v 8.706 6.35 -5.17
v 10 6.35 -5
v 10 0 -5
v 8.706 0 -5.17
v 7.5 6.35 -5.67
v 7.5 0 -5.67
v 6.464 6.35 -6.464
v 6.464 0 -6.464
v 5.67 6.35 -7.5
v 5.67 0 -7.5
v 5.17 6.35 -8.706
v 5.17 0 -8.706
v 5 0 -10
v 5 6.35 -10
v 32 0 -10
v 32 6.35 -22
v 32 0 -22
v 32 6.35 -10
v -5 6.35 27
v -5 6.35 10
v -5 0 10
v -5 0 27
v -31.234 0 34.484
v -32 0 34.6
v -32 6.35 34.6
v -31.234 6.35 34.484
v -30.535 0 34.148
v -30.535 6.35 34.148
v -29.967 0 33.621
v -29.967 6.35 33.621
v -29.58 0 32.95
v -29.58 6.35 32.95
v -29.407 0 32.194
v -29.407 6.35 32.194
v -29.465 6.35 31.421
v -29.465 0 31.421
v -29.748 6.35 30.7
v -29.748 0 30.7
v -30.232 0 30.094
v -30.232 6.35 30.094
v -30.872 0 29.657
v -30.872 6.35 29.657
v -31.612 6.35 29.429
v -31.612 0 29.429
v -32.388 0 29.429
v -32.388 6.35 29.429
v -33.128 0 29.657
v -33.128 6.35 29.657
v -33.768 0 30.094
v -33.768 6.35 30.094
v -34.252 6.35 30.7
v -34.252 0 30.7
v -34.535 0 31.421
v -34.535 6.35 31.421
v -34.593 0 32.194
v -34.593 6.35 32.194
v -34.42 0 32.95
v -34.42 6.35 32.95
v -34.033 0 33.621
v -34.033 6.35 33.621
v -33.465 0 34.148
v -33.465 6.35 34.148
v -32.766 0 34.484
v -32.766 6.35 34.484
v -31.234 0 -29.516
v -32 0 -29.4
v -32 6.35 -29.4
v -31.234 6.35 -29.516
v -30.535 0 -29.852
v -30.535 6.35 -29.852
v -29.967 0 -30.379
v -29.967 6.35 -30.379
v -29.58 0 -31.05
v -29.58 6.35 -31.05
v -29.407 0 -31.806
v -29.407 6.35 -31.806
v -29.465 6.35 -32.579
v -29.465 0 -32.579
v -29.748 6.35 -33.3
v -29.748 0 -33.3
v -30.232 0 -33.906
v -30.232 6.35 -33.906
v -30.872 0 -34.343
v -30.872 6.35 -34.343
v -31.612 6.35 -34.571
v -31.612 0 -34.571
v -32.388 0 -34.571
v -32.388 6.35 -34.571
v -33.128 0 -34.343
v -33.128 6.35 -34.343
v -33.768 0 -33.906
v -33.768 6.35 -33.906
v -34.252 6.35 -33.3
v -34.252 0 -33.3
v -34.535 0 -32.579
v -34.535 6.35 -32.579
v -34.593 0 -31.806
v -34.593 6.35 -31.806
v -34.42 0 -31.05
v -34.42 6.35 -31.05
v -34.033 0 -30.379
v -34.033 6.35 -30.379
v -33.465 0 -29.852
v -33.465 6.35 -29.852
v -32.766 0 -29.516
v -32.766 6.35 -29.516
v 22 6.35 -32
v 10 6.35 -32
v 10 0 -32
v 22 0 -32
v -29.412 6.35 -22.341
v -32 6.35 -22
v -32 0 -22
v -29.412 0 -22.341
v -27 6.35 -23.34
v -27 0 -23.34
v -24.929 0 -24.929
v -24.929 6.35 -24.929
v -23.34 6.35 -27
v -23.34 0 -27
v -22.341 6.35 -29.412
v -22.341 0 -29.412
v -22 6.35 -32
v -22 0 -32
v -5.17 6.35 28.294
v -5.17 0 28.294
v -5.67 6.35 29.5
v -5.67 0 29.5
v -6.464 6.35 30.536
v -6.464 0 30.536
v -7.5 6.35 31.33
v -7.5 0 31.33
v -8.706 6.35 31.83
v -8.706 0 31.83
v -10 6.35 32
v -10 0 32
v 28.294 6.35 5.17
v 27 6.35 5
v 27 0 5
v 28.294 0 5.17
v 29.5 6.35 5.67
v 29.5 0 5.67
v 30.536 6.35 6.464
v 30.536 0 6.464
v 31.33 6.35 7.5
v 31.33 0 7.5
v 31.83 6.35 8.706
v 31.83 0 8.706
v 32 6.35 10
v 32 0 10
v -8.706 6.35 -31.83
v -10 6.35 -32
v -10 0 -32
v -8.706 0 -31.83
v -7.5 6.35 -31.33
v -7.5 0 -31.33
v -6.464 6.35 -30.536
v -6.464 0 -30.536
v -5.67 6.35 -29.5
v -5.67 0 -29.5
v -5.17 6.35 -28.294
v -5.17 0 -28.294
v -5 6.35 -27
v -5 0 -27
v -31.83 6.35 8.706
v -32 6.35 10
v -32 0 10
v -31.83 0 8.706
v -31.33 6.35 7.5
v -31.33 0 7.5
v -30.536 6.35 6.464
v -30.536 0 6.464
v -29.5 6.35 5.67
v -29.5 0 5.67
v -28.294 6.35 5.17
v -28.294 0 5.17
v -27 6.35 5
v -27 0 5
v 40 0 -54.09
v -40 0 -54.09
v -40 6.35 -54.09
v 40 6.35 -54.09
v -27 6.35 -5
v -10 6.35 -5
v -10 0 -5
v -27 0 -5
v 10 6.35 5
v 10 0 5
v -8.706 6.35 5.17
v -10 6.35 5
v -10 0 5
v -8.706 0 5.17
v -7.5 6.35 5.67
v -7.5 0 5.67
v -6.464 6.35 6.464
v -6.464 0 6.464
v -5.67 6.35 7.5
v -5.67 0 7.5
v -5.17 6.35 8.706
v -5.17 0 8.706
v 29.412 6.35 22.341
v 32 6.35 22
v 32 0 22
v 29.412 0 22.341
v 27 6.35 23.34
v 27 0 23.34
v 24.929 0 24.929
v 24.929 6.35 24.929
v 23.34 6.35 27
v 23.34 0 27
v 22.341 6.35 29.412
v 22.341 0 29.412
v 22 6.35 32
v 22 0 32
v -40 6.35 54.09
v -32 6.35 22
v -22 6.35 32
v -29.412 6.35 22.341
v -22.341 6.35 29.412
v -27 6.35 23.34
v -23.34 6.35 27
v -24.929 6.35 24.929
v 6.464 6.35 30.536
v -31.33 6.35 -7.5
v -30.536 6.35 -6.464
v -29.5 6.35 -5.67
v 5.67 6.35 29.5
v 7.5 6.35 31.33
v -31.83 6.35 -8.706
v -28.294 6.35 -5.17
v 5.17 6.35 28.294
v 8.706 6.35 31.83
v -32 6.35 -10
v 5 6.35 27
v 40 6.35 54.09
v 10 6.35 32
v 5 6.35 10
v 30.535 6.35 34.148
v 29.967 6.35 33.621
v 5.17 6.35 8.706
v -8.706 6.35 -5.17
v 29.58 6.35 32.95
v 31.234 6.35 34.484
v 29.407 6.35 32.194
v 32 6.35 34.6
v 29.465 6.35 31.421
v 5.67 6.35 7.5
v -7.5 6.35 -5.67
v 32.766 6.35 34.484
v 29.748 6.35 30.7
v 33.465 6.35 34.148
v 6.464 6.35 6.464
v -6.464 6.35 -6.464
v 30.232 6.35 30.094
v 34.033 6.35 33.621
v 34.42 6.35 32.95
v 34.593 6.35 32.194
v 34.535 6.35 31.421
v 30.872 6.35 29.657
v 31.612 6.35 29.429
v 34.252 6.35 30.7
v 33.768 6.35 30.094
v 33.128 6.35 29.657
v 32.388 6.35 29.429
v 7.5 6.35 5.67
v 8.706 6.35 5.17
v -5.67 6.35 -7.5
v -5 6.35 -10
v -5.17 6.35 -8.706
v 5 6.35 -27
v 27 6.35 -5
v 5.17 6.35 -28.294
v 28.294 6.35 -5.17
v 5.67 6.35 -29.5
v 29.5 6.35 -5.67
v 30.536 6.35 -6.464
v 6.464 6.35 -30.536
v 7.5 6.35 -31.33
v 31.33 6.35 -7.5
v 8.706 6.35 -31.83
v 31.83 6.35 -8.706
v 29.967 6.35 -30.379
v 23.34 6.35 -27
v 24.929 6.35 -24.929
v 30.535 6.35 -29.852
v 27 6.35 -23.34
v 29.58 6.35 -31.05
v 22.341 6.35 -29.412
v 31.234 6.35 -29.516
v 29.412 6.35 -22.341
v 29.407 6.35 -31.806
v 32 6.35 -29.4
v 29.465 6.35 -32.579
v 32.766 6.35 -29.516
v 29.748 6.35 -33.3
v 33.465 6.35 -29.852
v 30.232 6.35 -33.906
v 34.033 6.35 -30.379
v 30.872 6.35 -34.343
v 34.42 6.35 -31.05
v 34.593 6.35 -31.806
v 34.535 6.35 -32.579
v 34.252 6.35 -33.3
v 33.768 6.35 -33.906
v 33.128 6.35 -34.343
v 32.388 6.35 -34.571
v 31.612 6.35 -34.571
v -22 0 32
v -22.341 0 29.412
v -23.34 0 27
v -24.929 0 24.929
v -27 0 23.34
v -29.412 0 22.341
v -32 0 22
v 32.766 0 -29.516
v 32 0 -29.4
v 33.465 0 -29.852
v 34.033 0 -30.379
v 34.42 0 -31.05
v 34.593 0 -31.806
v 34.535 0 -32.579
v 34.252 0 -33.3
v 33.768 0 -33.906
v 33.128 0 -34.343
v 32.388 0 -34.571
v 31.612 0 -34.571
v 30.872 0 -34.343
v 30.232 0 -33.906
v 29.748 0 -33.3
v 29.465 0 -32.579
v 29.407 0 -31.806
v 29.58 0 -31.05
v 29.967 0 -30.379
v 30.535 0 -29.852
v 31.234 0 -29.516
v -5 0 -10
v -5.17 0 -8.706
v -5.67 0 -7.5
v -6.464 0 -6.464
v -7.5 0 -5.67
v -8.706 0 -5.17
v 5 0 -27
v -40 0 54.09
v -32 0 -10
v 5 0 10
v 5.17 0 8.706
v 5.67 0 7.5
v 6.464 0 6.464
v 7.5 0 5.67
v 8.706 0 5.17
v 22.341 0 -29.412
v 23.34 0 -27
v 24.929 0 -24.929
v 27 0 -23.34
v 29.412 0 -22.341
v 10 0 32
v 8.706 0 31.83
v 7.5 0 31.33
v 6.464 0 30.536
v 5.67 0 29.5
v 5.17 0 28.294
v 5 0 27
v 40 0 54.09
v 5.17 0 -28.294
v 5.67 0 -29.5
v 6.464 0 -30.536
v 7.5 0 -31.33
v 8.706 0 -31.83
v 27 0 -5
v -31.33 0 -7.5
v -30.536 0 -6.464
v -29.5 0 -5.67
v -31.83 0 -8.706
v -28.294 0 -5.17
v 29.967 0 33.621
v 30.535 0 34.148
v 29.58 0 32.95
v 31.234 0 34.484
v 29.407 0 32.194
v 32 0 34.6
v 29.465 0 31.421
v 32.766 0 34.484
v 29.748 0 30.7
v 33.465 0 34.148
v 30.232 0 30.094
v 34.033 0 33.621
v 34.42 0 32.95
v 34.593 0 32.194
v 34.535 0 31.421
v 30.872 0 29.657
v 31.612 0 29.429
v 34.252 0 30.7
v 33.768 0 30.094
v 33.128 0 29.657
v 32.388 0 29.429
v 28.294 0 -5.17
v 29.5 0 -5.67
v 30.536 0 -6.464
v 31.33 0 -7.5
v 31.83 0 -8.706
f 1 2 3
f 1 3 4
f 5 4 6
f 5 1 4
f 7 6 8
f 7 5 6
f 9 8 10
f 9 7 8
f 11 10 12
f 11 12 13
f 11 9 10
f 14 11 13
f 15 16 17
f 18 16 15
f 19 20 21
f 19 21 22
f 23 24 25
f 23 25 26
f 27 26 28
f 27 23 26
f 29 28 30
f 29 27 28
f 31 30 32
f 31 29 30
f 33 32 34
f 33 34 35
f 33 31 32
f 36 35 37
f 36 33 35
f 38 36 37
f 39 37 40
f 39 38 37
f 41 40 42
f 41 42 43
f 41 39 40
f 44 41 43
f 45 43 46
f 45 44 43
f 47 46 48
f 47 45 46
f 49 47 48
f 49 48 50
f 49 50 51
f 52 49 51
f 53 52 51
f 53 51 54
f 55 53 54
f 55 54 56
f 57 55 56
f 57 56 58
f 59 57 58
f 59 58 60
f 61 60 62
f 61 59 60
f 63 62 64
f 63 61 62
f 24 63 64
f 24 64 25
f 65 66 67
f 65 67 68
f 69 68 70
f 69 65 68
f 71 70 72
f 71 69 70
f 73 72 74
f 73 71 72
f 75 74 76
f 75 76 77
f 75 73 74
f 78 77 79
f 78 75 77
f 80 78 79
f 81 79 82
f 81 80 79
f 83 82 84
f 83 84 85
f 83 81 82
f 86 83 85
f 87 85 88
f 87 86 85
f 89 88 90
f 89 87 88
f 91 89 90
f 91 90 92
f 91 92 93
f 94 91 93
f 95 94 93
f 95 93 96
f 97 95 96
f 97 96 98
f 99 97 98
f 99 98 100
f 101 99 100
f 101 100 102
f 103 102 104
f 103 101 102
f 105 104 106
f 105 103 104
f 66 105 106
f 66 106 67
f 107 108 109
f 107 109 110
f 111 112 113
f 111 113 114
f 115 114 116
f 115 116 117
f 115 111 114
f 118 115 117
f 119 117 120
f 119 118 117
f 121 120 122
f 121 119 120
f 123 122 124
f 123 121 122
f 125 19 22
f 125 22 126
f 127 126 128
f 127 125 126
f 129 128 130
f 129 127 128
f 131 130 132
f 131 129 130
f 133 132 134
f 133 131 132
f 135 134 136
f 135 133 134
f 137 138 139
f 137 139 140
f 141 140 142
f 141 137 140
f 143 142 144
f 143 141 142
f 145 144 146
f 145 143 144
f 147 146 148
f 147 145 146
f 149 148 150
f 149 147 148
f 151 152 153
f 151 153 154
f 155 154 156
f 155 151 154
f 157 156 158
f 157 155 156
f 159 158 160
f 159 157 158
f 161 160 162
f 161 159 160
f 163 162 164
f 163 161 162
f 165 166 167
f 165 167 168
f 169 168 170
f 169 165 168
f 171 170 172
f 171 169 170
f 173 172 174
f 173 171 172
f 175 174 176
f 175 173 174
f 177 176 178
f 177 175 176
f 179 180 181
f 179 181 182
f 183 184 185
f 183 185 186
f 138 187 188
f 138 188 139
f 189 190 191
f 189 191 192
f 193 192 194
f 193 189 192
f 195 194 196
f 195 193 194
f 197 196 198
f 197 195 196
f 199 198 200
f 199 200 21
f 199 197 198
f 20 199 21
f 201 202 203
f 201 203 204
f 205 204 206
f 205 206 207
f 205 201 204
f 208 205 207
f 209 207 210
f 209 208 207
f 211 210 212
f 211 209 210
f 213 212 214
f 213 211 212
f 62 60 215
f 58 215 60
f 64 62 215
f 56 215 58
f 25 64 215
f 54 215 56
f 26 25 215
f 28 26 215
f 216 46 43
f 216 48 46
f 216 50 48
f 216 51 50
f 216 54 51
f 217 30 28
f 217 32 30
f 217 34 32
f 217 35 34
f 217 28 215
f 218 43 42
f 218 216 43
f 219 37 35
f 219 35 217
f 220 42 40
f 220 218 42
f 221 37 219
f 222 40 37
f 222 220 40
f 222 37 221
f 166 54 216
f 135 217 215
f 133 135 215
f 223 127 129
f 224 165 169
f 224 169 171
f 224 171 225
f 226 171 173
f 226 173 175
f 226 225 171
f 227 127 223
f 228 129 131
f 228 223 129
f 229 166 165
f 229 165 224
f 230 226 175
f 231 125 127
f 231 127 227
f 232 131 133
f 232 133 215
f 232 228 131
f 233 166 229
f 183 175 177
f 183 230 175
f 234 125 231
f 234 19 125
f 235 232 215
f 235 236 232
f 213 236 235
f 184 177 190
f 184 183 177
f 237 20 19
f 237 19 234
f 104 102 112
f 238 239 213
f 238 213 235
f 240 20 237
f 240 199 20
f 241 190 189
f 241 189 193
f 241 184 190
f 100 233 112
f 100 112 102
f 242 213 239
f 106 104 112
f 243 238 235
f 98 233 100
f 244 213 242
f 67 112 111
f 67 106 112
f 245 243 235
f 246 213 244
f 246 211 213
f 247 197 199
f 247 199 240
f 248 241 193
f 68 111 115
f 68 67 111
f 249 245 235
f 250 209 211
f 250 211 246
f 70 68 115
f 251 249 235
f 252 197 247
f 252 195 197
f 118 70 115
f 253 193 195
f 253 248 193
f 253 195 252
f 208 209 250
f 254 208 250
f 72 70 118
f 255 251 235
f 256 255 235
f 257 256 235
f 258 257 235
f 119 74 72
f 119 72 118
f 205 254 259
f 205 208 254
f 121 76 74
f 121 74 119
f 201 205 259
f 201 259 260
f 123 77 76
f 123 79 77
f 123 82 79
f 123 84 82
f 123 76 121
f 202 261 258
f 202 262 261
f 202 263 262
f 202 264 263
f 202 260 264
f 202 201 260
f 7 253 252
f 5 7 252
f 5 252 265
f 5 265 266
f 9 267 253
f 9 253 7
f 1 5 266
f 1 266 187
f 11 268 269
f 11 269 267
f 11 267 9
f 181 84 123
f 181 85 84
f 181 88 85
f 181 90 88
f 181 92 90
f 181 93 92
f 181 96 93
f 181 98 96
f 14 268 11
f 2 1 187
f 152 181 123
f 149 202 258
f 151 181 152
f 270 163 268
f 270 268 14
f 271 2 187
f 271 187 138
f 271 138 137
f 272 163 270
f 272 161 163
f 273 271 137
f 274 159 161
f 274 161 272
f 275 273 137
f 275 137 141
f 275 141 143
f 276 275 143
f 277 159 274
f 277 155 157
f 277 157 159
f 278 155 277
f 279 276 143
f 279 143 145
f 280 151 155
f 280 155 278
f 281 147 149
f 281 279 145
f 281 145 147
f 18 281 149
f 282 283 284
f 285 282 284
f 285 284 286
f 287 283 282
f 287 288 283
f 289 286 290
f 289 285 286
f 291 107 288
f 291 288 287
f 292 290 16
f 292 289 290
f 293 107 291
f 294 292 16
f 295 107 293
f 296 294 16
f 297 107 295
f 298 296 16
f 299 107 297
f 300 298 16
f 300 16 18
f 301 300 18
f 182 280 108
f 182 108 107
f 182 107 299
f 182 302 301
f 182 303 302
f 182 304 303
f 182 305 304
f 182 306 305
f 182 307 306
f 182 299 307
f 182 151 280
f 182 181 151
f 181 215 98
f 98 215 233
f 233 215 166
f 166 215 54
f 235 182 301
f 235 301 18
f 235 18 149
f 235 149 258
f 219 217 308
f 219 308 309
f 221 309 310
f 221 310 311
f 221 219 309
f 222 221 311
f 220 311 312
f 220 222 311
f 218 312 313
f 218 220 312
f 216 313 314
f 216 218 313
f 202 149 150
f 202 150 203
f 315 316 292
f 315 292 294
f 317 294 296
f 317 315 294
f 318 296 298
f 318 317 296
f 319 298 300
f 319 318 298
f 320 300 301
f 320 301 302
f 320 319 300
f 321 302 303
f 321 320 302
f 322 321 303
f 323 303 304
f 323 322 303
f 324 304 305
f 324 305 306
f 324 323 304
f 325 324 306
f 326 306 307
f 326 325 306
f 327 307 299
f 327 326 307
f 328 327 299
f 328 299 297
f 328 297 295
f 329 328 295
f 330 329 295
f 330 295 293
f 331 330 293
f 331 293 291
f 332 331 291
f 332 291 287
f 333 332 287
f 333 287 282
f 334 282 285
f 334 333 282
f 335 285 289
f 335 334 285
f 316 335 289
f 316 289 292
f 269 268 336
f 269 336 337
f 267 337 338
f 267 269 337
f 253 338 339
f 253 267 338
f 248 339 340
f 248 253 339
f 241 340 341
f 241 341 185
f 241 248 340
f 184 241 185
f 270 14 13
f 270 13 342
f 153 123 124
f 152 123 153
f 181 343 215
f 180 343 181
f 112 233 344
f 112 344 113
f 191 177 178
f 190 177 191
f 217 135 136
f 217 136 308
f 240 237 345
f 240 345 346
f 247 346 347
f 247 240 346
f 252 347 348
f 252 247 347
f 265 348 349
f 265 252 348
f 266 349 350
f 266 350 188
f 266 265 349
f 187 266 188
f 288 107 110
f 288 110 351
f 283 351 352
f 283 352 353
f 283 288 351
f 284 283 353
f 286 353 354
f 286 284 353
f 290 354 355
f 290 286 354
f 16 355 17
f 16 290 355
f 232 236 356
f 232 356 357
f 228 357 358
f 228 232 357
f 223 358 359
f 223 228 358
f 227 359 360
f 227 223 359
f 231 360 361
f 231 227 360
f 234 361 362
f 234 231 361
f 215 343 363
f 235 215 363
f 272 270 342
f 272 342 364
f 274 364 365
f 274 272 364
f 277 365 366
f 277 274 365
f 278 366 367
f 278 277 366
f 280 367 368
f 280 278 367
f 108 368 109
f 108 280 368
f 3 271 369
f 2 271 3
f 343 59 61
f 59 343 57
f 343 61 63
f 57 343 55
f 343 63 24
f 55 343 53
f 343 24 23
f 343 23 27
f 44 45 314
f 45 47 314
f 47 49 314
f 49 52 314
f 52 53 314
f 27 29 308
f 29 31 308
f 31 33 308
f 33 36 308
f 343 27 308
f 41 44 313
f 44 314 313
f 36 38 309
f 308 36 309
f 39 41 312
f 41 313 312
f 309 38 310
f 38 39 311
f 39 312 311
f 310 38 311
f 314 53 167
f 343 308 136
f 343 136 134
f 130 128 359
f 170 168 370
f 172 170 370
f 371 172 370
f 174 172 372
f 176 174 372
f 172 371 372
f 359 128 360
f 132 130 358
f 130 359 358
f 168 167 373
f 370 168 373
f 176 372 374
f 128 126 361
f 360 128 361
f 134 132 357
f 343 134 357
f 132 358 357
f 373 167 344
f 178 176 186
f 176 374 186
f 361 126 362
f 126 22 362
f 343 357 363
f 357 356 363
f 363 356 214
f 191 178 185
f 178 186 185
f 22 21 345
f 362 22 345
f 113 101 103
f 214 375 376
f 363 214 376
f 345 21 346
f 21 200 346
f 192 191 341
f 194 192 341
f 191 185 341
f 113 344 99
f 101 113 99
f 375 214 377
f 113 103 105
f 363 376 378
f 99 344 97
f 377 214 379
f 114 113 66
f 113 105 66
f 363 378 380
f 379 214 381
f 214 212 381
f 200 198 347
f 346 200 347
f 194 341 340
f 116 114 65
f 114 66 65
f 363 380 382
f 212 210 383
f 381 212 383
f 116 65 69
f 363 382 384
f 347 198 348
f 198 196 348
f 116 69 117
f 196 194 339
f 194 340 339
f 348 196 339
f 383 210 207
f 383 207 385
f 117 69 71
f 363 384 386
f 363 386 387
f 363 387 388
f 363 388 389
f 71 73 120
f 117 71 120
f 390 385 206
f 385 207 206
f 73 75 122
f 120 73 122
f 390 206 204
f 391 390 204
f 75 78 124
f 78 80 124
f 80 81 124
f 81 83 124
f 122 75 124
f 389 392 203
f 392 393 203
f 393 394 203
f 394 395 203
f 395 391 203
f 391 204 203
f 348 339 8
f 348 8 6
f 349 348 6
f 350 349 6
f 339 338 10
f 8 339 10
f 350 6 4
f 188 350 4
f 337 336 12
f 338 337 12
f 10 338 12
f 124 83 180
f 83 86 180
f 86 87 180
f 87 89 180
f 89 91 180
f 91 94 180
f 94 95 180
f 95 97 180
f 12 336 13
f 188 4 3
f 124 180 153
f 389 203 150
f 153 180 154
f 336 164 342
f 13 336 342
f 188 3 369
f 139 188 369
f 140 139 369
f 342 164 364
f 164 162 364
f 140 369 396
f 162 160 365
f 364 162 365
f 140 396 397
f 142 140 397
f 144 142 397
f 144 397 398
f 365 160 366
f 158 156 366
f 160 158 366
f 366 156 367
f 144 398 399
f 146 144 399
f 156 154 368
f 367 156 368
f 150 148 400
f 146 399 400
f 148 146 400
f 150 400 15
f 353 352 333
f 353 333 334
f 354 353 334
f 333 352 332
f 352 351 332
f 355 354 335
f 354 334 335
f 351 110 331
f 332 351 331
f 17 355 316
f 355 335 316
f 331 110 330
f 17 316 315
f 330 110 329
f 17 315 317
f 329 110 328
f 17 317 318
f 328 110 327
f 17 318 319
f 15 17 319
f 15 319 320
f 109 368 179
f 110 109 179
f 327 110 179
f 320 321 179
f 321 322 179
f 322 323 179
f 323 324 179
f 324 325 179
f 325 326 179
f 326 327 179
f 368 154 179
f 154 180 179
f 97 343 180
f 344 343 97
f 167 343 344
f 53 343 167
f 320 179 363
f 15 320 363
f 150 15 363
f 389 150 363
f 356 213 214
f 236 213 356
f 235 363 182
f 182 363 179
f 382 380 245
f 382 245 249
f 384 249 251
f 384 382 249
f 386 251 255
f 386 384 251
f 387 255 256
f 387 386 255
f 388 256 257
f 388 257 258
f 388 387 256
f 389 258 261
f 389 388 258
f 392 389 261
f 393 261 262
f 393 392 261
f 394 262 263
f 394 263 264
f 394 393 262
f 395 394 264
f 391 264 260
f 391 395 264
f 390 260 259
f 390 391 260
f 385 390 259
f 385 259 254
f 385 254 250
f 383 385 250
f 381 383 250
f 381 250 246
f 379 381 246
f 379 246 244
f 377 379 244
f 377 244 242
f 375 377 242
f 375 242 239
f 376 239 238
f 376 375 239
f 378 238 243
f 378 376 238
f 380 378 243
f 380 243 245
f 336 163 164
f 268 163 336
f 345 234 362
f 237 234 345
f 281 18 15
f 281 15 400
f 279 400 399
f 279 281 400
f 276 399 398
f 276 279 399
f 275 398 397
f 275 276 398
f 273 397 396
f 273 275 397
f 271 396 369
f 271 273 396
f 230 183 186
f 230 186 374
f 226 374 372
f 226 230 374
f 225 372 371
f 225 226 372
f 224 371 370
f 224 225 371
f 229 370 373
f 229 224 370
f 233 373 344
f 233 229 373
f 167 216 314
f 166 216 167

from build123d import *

# Parameters (mm, degrees)
SKETCH1_W           = 80
SKETCH1_H           = 108.18
SKETCH1_R           = 2.6
BOSS_EXTRUDE1_DEPTH = 6.35
CUT_EXTRUDE1_DEPTH  = 6.35


with BuildPart() as part:
    # Sketch1 → Boss-Extrude1 (new body)
    with BuildSketch(Plane(origin=(0, 0, 0), x_dir=(1, 0, 0), z_dir=(0, 1, 0))):
        Rectangle(SKETCH1_W, SKETCH1_H)
        with Locations(Location((-32, 32, 0), (0, 0, 270))):
            Circle(SKETCH1_R, mode=Mode.SUBTRACT)
        with Locations(Location((32, 32, 0), (0, 0, 270))):
            Circle(SKETCH1_R, mode=Mode.SUBTRACT)
        with Locations(Location((32, -32, 0), (0, 0, 270))):
            Circle(SKETCH1_R, mode=Mode.SUBTRACT)
        with Locations(Location((-32, -32, 0), (0, 0, 270))):
            Circle(SKETCH1_R, mode=Mode.SUBTRACT)
    extrude(amount=BOSS_EXTRUDE1_DEPTH)

    # Sketch2 → Cut-Extrude1 (cut)
    with BuildSketch(Plane(origin=(0, 6.35, 0), x_dir=(1, 0, 0), z_dir=(0, 1, 0))):
        with BuildLine():
            Line((-27, -5), (-10, -5))
            ThreePointArc((-10, -5), (-6.464466094, -6.464466094), (-5, -10))
            Line((-5, -10), (-5, -27))
            ThreePointArc((-5, -27), (-6.464466094, -30.535533906), (-10, -32))
            Line((-10, -32), (-22, -32))
            ThreePointArc((-22, -32), (-24.928932188, -24.928932188), (-32, -22))
            Line((-32, -22), (-32, -10))
            ThreePointArc((-32, -10), (-30.535533906, -6.464466094), (-27, -5))
        make_face()
        with BuildLine():
            Line((-22, 32), (-10, 32))
            ThreePointArc((-10, 32), (-6.464466094, 30.535533906), (-5, 27))
            Line((-5, 27), (-5, 10))
            ThreePointArc((-5, 10), (-6.464466094, 6.464466094), (-10, 5))
            Line((-10, 5), (-27, 5))
            ThreePointArc((-27, 5), (-30.535533906, 6.464466094), (-32, 10))
            Line((-32, 10), (-32, 22))
            ThreePointArc((-32, 22), (-24.928932188, 24.928932188), (-22, 32))
        make_face()
        with BuildLine():
            Line((32, 22), (32, 10))
            ThreePointArc((32, 10), (30.535533906, 6.464466094), (27, 5))
            Line((27, 5), (10, 5))
            ThreePointArc((10, 5), (6.464466094, 6.464466094), (5, 10))
            Line((5, 10), (5, 27))
            ThreePointArc((5, 27), (6.464466094, 30.535533906), (10, 32))
            Line((10, 32), (22, 32))
            ThreePointArc((22, 32), (24.928932188, 24.928932188), (32, 22))
        make_face()
        with BuildLine():
            Line((22, -32), (10, -32))
            ThreePointArc((10, -32), (6.464466094, -30.535533906), (5, -27))
            Line((5, -27), (5, -10))
            ThreePointArc((5, -10), (6.464466094, -6.464466094), (10, -5))
            Line((10, -5), (27, -5))
            ThreePointArc((27, -5), (30.535533906, -6.464466094), (32, -10))
            Line((32, -10), (32, -22))
            ThreePointArc((32, -22), (24.928932188, -24.928932188), (22, -32))
        make_face()
    extrude(amount=-CUT_EXTRUDE1_DEPTH, mode=Mode.SUBTRACT)


solid = part.part
